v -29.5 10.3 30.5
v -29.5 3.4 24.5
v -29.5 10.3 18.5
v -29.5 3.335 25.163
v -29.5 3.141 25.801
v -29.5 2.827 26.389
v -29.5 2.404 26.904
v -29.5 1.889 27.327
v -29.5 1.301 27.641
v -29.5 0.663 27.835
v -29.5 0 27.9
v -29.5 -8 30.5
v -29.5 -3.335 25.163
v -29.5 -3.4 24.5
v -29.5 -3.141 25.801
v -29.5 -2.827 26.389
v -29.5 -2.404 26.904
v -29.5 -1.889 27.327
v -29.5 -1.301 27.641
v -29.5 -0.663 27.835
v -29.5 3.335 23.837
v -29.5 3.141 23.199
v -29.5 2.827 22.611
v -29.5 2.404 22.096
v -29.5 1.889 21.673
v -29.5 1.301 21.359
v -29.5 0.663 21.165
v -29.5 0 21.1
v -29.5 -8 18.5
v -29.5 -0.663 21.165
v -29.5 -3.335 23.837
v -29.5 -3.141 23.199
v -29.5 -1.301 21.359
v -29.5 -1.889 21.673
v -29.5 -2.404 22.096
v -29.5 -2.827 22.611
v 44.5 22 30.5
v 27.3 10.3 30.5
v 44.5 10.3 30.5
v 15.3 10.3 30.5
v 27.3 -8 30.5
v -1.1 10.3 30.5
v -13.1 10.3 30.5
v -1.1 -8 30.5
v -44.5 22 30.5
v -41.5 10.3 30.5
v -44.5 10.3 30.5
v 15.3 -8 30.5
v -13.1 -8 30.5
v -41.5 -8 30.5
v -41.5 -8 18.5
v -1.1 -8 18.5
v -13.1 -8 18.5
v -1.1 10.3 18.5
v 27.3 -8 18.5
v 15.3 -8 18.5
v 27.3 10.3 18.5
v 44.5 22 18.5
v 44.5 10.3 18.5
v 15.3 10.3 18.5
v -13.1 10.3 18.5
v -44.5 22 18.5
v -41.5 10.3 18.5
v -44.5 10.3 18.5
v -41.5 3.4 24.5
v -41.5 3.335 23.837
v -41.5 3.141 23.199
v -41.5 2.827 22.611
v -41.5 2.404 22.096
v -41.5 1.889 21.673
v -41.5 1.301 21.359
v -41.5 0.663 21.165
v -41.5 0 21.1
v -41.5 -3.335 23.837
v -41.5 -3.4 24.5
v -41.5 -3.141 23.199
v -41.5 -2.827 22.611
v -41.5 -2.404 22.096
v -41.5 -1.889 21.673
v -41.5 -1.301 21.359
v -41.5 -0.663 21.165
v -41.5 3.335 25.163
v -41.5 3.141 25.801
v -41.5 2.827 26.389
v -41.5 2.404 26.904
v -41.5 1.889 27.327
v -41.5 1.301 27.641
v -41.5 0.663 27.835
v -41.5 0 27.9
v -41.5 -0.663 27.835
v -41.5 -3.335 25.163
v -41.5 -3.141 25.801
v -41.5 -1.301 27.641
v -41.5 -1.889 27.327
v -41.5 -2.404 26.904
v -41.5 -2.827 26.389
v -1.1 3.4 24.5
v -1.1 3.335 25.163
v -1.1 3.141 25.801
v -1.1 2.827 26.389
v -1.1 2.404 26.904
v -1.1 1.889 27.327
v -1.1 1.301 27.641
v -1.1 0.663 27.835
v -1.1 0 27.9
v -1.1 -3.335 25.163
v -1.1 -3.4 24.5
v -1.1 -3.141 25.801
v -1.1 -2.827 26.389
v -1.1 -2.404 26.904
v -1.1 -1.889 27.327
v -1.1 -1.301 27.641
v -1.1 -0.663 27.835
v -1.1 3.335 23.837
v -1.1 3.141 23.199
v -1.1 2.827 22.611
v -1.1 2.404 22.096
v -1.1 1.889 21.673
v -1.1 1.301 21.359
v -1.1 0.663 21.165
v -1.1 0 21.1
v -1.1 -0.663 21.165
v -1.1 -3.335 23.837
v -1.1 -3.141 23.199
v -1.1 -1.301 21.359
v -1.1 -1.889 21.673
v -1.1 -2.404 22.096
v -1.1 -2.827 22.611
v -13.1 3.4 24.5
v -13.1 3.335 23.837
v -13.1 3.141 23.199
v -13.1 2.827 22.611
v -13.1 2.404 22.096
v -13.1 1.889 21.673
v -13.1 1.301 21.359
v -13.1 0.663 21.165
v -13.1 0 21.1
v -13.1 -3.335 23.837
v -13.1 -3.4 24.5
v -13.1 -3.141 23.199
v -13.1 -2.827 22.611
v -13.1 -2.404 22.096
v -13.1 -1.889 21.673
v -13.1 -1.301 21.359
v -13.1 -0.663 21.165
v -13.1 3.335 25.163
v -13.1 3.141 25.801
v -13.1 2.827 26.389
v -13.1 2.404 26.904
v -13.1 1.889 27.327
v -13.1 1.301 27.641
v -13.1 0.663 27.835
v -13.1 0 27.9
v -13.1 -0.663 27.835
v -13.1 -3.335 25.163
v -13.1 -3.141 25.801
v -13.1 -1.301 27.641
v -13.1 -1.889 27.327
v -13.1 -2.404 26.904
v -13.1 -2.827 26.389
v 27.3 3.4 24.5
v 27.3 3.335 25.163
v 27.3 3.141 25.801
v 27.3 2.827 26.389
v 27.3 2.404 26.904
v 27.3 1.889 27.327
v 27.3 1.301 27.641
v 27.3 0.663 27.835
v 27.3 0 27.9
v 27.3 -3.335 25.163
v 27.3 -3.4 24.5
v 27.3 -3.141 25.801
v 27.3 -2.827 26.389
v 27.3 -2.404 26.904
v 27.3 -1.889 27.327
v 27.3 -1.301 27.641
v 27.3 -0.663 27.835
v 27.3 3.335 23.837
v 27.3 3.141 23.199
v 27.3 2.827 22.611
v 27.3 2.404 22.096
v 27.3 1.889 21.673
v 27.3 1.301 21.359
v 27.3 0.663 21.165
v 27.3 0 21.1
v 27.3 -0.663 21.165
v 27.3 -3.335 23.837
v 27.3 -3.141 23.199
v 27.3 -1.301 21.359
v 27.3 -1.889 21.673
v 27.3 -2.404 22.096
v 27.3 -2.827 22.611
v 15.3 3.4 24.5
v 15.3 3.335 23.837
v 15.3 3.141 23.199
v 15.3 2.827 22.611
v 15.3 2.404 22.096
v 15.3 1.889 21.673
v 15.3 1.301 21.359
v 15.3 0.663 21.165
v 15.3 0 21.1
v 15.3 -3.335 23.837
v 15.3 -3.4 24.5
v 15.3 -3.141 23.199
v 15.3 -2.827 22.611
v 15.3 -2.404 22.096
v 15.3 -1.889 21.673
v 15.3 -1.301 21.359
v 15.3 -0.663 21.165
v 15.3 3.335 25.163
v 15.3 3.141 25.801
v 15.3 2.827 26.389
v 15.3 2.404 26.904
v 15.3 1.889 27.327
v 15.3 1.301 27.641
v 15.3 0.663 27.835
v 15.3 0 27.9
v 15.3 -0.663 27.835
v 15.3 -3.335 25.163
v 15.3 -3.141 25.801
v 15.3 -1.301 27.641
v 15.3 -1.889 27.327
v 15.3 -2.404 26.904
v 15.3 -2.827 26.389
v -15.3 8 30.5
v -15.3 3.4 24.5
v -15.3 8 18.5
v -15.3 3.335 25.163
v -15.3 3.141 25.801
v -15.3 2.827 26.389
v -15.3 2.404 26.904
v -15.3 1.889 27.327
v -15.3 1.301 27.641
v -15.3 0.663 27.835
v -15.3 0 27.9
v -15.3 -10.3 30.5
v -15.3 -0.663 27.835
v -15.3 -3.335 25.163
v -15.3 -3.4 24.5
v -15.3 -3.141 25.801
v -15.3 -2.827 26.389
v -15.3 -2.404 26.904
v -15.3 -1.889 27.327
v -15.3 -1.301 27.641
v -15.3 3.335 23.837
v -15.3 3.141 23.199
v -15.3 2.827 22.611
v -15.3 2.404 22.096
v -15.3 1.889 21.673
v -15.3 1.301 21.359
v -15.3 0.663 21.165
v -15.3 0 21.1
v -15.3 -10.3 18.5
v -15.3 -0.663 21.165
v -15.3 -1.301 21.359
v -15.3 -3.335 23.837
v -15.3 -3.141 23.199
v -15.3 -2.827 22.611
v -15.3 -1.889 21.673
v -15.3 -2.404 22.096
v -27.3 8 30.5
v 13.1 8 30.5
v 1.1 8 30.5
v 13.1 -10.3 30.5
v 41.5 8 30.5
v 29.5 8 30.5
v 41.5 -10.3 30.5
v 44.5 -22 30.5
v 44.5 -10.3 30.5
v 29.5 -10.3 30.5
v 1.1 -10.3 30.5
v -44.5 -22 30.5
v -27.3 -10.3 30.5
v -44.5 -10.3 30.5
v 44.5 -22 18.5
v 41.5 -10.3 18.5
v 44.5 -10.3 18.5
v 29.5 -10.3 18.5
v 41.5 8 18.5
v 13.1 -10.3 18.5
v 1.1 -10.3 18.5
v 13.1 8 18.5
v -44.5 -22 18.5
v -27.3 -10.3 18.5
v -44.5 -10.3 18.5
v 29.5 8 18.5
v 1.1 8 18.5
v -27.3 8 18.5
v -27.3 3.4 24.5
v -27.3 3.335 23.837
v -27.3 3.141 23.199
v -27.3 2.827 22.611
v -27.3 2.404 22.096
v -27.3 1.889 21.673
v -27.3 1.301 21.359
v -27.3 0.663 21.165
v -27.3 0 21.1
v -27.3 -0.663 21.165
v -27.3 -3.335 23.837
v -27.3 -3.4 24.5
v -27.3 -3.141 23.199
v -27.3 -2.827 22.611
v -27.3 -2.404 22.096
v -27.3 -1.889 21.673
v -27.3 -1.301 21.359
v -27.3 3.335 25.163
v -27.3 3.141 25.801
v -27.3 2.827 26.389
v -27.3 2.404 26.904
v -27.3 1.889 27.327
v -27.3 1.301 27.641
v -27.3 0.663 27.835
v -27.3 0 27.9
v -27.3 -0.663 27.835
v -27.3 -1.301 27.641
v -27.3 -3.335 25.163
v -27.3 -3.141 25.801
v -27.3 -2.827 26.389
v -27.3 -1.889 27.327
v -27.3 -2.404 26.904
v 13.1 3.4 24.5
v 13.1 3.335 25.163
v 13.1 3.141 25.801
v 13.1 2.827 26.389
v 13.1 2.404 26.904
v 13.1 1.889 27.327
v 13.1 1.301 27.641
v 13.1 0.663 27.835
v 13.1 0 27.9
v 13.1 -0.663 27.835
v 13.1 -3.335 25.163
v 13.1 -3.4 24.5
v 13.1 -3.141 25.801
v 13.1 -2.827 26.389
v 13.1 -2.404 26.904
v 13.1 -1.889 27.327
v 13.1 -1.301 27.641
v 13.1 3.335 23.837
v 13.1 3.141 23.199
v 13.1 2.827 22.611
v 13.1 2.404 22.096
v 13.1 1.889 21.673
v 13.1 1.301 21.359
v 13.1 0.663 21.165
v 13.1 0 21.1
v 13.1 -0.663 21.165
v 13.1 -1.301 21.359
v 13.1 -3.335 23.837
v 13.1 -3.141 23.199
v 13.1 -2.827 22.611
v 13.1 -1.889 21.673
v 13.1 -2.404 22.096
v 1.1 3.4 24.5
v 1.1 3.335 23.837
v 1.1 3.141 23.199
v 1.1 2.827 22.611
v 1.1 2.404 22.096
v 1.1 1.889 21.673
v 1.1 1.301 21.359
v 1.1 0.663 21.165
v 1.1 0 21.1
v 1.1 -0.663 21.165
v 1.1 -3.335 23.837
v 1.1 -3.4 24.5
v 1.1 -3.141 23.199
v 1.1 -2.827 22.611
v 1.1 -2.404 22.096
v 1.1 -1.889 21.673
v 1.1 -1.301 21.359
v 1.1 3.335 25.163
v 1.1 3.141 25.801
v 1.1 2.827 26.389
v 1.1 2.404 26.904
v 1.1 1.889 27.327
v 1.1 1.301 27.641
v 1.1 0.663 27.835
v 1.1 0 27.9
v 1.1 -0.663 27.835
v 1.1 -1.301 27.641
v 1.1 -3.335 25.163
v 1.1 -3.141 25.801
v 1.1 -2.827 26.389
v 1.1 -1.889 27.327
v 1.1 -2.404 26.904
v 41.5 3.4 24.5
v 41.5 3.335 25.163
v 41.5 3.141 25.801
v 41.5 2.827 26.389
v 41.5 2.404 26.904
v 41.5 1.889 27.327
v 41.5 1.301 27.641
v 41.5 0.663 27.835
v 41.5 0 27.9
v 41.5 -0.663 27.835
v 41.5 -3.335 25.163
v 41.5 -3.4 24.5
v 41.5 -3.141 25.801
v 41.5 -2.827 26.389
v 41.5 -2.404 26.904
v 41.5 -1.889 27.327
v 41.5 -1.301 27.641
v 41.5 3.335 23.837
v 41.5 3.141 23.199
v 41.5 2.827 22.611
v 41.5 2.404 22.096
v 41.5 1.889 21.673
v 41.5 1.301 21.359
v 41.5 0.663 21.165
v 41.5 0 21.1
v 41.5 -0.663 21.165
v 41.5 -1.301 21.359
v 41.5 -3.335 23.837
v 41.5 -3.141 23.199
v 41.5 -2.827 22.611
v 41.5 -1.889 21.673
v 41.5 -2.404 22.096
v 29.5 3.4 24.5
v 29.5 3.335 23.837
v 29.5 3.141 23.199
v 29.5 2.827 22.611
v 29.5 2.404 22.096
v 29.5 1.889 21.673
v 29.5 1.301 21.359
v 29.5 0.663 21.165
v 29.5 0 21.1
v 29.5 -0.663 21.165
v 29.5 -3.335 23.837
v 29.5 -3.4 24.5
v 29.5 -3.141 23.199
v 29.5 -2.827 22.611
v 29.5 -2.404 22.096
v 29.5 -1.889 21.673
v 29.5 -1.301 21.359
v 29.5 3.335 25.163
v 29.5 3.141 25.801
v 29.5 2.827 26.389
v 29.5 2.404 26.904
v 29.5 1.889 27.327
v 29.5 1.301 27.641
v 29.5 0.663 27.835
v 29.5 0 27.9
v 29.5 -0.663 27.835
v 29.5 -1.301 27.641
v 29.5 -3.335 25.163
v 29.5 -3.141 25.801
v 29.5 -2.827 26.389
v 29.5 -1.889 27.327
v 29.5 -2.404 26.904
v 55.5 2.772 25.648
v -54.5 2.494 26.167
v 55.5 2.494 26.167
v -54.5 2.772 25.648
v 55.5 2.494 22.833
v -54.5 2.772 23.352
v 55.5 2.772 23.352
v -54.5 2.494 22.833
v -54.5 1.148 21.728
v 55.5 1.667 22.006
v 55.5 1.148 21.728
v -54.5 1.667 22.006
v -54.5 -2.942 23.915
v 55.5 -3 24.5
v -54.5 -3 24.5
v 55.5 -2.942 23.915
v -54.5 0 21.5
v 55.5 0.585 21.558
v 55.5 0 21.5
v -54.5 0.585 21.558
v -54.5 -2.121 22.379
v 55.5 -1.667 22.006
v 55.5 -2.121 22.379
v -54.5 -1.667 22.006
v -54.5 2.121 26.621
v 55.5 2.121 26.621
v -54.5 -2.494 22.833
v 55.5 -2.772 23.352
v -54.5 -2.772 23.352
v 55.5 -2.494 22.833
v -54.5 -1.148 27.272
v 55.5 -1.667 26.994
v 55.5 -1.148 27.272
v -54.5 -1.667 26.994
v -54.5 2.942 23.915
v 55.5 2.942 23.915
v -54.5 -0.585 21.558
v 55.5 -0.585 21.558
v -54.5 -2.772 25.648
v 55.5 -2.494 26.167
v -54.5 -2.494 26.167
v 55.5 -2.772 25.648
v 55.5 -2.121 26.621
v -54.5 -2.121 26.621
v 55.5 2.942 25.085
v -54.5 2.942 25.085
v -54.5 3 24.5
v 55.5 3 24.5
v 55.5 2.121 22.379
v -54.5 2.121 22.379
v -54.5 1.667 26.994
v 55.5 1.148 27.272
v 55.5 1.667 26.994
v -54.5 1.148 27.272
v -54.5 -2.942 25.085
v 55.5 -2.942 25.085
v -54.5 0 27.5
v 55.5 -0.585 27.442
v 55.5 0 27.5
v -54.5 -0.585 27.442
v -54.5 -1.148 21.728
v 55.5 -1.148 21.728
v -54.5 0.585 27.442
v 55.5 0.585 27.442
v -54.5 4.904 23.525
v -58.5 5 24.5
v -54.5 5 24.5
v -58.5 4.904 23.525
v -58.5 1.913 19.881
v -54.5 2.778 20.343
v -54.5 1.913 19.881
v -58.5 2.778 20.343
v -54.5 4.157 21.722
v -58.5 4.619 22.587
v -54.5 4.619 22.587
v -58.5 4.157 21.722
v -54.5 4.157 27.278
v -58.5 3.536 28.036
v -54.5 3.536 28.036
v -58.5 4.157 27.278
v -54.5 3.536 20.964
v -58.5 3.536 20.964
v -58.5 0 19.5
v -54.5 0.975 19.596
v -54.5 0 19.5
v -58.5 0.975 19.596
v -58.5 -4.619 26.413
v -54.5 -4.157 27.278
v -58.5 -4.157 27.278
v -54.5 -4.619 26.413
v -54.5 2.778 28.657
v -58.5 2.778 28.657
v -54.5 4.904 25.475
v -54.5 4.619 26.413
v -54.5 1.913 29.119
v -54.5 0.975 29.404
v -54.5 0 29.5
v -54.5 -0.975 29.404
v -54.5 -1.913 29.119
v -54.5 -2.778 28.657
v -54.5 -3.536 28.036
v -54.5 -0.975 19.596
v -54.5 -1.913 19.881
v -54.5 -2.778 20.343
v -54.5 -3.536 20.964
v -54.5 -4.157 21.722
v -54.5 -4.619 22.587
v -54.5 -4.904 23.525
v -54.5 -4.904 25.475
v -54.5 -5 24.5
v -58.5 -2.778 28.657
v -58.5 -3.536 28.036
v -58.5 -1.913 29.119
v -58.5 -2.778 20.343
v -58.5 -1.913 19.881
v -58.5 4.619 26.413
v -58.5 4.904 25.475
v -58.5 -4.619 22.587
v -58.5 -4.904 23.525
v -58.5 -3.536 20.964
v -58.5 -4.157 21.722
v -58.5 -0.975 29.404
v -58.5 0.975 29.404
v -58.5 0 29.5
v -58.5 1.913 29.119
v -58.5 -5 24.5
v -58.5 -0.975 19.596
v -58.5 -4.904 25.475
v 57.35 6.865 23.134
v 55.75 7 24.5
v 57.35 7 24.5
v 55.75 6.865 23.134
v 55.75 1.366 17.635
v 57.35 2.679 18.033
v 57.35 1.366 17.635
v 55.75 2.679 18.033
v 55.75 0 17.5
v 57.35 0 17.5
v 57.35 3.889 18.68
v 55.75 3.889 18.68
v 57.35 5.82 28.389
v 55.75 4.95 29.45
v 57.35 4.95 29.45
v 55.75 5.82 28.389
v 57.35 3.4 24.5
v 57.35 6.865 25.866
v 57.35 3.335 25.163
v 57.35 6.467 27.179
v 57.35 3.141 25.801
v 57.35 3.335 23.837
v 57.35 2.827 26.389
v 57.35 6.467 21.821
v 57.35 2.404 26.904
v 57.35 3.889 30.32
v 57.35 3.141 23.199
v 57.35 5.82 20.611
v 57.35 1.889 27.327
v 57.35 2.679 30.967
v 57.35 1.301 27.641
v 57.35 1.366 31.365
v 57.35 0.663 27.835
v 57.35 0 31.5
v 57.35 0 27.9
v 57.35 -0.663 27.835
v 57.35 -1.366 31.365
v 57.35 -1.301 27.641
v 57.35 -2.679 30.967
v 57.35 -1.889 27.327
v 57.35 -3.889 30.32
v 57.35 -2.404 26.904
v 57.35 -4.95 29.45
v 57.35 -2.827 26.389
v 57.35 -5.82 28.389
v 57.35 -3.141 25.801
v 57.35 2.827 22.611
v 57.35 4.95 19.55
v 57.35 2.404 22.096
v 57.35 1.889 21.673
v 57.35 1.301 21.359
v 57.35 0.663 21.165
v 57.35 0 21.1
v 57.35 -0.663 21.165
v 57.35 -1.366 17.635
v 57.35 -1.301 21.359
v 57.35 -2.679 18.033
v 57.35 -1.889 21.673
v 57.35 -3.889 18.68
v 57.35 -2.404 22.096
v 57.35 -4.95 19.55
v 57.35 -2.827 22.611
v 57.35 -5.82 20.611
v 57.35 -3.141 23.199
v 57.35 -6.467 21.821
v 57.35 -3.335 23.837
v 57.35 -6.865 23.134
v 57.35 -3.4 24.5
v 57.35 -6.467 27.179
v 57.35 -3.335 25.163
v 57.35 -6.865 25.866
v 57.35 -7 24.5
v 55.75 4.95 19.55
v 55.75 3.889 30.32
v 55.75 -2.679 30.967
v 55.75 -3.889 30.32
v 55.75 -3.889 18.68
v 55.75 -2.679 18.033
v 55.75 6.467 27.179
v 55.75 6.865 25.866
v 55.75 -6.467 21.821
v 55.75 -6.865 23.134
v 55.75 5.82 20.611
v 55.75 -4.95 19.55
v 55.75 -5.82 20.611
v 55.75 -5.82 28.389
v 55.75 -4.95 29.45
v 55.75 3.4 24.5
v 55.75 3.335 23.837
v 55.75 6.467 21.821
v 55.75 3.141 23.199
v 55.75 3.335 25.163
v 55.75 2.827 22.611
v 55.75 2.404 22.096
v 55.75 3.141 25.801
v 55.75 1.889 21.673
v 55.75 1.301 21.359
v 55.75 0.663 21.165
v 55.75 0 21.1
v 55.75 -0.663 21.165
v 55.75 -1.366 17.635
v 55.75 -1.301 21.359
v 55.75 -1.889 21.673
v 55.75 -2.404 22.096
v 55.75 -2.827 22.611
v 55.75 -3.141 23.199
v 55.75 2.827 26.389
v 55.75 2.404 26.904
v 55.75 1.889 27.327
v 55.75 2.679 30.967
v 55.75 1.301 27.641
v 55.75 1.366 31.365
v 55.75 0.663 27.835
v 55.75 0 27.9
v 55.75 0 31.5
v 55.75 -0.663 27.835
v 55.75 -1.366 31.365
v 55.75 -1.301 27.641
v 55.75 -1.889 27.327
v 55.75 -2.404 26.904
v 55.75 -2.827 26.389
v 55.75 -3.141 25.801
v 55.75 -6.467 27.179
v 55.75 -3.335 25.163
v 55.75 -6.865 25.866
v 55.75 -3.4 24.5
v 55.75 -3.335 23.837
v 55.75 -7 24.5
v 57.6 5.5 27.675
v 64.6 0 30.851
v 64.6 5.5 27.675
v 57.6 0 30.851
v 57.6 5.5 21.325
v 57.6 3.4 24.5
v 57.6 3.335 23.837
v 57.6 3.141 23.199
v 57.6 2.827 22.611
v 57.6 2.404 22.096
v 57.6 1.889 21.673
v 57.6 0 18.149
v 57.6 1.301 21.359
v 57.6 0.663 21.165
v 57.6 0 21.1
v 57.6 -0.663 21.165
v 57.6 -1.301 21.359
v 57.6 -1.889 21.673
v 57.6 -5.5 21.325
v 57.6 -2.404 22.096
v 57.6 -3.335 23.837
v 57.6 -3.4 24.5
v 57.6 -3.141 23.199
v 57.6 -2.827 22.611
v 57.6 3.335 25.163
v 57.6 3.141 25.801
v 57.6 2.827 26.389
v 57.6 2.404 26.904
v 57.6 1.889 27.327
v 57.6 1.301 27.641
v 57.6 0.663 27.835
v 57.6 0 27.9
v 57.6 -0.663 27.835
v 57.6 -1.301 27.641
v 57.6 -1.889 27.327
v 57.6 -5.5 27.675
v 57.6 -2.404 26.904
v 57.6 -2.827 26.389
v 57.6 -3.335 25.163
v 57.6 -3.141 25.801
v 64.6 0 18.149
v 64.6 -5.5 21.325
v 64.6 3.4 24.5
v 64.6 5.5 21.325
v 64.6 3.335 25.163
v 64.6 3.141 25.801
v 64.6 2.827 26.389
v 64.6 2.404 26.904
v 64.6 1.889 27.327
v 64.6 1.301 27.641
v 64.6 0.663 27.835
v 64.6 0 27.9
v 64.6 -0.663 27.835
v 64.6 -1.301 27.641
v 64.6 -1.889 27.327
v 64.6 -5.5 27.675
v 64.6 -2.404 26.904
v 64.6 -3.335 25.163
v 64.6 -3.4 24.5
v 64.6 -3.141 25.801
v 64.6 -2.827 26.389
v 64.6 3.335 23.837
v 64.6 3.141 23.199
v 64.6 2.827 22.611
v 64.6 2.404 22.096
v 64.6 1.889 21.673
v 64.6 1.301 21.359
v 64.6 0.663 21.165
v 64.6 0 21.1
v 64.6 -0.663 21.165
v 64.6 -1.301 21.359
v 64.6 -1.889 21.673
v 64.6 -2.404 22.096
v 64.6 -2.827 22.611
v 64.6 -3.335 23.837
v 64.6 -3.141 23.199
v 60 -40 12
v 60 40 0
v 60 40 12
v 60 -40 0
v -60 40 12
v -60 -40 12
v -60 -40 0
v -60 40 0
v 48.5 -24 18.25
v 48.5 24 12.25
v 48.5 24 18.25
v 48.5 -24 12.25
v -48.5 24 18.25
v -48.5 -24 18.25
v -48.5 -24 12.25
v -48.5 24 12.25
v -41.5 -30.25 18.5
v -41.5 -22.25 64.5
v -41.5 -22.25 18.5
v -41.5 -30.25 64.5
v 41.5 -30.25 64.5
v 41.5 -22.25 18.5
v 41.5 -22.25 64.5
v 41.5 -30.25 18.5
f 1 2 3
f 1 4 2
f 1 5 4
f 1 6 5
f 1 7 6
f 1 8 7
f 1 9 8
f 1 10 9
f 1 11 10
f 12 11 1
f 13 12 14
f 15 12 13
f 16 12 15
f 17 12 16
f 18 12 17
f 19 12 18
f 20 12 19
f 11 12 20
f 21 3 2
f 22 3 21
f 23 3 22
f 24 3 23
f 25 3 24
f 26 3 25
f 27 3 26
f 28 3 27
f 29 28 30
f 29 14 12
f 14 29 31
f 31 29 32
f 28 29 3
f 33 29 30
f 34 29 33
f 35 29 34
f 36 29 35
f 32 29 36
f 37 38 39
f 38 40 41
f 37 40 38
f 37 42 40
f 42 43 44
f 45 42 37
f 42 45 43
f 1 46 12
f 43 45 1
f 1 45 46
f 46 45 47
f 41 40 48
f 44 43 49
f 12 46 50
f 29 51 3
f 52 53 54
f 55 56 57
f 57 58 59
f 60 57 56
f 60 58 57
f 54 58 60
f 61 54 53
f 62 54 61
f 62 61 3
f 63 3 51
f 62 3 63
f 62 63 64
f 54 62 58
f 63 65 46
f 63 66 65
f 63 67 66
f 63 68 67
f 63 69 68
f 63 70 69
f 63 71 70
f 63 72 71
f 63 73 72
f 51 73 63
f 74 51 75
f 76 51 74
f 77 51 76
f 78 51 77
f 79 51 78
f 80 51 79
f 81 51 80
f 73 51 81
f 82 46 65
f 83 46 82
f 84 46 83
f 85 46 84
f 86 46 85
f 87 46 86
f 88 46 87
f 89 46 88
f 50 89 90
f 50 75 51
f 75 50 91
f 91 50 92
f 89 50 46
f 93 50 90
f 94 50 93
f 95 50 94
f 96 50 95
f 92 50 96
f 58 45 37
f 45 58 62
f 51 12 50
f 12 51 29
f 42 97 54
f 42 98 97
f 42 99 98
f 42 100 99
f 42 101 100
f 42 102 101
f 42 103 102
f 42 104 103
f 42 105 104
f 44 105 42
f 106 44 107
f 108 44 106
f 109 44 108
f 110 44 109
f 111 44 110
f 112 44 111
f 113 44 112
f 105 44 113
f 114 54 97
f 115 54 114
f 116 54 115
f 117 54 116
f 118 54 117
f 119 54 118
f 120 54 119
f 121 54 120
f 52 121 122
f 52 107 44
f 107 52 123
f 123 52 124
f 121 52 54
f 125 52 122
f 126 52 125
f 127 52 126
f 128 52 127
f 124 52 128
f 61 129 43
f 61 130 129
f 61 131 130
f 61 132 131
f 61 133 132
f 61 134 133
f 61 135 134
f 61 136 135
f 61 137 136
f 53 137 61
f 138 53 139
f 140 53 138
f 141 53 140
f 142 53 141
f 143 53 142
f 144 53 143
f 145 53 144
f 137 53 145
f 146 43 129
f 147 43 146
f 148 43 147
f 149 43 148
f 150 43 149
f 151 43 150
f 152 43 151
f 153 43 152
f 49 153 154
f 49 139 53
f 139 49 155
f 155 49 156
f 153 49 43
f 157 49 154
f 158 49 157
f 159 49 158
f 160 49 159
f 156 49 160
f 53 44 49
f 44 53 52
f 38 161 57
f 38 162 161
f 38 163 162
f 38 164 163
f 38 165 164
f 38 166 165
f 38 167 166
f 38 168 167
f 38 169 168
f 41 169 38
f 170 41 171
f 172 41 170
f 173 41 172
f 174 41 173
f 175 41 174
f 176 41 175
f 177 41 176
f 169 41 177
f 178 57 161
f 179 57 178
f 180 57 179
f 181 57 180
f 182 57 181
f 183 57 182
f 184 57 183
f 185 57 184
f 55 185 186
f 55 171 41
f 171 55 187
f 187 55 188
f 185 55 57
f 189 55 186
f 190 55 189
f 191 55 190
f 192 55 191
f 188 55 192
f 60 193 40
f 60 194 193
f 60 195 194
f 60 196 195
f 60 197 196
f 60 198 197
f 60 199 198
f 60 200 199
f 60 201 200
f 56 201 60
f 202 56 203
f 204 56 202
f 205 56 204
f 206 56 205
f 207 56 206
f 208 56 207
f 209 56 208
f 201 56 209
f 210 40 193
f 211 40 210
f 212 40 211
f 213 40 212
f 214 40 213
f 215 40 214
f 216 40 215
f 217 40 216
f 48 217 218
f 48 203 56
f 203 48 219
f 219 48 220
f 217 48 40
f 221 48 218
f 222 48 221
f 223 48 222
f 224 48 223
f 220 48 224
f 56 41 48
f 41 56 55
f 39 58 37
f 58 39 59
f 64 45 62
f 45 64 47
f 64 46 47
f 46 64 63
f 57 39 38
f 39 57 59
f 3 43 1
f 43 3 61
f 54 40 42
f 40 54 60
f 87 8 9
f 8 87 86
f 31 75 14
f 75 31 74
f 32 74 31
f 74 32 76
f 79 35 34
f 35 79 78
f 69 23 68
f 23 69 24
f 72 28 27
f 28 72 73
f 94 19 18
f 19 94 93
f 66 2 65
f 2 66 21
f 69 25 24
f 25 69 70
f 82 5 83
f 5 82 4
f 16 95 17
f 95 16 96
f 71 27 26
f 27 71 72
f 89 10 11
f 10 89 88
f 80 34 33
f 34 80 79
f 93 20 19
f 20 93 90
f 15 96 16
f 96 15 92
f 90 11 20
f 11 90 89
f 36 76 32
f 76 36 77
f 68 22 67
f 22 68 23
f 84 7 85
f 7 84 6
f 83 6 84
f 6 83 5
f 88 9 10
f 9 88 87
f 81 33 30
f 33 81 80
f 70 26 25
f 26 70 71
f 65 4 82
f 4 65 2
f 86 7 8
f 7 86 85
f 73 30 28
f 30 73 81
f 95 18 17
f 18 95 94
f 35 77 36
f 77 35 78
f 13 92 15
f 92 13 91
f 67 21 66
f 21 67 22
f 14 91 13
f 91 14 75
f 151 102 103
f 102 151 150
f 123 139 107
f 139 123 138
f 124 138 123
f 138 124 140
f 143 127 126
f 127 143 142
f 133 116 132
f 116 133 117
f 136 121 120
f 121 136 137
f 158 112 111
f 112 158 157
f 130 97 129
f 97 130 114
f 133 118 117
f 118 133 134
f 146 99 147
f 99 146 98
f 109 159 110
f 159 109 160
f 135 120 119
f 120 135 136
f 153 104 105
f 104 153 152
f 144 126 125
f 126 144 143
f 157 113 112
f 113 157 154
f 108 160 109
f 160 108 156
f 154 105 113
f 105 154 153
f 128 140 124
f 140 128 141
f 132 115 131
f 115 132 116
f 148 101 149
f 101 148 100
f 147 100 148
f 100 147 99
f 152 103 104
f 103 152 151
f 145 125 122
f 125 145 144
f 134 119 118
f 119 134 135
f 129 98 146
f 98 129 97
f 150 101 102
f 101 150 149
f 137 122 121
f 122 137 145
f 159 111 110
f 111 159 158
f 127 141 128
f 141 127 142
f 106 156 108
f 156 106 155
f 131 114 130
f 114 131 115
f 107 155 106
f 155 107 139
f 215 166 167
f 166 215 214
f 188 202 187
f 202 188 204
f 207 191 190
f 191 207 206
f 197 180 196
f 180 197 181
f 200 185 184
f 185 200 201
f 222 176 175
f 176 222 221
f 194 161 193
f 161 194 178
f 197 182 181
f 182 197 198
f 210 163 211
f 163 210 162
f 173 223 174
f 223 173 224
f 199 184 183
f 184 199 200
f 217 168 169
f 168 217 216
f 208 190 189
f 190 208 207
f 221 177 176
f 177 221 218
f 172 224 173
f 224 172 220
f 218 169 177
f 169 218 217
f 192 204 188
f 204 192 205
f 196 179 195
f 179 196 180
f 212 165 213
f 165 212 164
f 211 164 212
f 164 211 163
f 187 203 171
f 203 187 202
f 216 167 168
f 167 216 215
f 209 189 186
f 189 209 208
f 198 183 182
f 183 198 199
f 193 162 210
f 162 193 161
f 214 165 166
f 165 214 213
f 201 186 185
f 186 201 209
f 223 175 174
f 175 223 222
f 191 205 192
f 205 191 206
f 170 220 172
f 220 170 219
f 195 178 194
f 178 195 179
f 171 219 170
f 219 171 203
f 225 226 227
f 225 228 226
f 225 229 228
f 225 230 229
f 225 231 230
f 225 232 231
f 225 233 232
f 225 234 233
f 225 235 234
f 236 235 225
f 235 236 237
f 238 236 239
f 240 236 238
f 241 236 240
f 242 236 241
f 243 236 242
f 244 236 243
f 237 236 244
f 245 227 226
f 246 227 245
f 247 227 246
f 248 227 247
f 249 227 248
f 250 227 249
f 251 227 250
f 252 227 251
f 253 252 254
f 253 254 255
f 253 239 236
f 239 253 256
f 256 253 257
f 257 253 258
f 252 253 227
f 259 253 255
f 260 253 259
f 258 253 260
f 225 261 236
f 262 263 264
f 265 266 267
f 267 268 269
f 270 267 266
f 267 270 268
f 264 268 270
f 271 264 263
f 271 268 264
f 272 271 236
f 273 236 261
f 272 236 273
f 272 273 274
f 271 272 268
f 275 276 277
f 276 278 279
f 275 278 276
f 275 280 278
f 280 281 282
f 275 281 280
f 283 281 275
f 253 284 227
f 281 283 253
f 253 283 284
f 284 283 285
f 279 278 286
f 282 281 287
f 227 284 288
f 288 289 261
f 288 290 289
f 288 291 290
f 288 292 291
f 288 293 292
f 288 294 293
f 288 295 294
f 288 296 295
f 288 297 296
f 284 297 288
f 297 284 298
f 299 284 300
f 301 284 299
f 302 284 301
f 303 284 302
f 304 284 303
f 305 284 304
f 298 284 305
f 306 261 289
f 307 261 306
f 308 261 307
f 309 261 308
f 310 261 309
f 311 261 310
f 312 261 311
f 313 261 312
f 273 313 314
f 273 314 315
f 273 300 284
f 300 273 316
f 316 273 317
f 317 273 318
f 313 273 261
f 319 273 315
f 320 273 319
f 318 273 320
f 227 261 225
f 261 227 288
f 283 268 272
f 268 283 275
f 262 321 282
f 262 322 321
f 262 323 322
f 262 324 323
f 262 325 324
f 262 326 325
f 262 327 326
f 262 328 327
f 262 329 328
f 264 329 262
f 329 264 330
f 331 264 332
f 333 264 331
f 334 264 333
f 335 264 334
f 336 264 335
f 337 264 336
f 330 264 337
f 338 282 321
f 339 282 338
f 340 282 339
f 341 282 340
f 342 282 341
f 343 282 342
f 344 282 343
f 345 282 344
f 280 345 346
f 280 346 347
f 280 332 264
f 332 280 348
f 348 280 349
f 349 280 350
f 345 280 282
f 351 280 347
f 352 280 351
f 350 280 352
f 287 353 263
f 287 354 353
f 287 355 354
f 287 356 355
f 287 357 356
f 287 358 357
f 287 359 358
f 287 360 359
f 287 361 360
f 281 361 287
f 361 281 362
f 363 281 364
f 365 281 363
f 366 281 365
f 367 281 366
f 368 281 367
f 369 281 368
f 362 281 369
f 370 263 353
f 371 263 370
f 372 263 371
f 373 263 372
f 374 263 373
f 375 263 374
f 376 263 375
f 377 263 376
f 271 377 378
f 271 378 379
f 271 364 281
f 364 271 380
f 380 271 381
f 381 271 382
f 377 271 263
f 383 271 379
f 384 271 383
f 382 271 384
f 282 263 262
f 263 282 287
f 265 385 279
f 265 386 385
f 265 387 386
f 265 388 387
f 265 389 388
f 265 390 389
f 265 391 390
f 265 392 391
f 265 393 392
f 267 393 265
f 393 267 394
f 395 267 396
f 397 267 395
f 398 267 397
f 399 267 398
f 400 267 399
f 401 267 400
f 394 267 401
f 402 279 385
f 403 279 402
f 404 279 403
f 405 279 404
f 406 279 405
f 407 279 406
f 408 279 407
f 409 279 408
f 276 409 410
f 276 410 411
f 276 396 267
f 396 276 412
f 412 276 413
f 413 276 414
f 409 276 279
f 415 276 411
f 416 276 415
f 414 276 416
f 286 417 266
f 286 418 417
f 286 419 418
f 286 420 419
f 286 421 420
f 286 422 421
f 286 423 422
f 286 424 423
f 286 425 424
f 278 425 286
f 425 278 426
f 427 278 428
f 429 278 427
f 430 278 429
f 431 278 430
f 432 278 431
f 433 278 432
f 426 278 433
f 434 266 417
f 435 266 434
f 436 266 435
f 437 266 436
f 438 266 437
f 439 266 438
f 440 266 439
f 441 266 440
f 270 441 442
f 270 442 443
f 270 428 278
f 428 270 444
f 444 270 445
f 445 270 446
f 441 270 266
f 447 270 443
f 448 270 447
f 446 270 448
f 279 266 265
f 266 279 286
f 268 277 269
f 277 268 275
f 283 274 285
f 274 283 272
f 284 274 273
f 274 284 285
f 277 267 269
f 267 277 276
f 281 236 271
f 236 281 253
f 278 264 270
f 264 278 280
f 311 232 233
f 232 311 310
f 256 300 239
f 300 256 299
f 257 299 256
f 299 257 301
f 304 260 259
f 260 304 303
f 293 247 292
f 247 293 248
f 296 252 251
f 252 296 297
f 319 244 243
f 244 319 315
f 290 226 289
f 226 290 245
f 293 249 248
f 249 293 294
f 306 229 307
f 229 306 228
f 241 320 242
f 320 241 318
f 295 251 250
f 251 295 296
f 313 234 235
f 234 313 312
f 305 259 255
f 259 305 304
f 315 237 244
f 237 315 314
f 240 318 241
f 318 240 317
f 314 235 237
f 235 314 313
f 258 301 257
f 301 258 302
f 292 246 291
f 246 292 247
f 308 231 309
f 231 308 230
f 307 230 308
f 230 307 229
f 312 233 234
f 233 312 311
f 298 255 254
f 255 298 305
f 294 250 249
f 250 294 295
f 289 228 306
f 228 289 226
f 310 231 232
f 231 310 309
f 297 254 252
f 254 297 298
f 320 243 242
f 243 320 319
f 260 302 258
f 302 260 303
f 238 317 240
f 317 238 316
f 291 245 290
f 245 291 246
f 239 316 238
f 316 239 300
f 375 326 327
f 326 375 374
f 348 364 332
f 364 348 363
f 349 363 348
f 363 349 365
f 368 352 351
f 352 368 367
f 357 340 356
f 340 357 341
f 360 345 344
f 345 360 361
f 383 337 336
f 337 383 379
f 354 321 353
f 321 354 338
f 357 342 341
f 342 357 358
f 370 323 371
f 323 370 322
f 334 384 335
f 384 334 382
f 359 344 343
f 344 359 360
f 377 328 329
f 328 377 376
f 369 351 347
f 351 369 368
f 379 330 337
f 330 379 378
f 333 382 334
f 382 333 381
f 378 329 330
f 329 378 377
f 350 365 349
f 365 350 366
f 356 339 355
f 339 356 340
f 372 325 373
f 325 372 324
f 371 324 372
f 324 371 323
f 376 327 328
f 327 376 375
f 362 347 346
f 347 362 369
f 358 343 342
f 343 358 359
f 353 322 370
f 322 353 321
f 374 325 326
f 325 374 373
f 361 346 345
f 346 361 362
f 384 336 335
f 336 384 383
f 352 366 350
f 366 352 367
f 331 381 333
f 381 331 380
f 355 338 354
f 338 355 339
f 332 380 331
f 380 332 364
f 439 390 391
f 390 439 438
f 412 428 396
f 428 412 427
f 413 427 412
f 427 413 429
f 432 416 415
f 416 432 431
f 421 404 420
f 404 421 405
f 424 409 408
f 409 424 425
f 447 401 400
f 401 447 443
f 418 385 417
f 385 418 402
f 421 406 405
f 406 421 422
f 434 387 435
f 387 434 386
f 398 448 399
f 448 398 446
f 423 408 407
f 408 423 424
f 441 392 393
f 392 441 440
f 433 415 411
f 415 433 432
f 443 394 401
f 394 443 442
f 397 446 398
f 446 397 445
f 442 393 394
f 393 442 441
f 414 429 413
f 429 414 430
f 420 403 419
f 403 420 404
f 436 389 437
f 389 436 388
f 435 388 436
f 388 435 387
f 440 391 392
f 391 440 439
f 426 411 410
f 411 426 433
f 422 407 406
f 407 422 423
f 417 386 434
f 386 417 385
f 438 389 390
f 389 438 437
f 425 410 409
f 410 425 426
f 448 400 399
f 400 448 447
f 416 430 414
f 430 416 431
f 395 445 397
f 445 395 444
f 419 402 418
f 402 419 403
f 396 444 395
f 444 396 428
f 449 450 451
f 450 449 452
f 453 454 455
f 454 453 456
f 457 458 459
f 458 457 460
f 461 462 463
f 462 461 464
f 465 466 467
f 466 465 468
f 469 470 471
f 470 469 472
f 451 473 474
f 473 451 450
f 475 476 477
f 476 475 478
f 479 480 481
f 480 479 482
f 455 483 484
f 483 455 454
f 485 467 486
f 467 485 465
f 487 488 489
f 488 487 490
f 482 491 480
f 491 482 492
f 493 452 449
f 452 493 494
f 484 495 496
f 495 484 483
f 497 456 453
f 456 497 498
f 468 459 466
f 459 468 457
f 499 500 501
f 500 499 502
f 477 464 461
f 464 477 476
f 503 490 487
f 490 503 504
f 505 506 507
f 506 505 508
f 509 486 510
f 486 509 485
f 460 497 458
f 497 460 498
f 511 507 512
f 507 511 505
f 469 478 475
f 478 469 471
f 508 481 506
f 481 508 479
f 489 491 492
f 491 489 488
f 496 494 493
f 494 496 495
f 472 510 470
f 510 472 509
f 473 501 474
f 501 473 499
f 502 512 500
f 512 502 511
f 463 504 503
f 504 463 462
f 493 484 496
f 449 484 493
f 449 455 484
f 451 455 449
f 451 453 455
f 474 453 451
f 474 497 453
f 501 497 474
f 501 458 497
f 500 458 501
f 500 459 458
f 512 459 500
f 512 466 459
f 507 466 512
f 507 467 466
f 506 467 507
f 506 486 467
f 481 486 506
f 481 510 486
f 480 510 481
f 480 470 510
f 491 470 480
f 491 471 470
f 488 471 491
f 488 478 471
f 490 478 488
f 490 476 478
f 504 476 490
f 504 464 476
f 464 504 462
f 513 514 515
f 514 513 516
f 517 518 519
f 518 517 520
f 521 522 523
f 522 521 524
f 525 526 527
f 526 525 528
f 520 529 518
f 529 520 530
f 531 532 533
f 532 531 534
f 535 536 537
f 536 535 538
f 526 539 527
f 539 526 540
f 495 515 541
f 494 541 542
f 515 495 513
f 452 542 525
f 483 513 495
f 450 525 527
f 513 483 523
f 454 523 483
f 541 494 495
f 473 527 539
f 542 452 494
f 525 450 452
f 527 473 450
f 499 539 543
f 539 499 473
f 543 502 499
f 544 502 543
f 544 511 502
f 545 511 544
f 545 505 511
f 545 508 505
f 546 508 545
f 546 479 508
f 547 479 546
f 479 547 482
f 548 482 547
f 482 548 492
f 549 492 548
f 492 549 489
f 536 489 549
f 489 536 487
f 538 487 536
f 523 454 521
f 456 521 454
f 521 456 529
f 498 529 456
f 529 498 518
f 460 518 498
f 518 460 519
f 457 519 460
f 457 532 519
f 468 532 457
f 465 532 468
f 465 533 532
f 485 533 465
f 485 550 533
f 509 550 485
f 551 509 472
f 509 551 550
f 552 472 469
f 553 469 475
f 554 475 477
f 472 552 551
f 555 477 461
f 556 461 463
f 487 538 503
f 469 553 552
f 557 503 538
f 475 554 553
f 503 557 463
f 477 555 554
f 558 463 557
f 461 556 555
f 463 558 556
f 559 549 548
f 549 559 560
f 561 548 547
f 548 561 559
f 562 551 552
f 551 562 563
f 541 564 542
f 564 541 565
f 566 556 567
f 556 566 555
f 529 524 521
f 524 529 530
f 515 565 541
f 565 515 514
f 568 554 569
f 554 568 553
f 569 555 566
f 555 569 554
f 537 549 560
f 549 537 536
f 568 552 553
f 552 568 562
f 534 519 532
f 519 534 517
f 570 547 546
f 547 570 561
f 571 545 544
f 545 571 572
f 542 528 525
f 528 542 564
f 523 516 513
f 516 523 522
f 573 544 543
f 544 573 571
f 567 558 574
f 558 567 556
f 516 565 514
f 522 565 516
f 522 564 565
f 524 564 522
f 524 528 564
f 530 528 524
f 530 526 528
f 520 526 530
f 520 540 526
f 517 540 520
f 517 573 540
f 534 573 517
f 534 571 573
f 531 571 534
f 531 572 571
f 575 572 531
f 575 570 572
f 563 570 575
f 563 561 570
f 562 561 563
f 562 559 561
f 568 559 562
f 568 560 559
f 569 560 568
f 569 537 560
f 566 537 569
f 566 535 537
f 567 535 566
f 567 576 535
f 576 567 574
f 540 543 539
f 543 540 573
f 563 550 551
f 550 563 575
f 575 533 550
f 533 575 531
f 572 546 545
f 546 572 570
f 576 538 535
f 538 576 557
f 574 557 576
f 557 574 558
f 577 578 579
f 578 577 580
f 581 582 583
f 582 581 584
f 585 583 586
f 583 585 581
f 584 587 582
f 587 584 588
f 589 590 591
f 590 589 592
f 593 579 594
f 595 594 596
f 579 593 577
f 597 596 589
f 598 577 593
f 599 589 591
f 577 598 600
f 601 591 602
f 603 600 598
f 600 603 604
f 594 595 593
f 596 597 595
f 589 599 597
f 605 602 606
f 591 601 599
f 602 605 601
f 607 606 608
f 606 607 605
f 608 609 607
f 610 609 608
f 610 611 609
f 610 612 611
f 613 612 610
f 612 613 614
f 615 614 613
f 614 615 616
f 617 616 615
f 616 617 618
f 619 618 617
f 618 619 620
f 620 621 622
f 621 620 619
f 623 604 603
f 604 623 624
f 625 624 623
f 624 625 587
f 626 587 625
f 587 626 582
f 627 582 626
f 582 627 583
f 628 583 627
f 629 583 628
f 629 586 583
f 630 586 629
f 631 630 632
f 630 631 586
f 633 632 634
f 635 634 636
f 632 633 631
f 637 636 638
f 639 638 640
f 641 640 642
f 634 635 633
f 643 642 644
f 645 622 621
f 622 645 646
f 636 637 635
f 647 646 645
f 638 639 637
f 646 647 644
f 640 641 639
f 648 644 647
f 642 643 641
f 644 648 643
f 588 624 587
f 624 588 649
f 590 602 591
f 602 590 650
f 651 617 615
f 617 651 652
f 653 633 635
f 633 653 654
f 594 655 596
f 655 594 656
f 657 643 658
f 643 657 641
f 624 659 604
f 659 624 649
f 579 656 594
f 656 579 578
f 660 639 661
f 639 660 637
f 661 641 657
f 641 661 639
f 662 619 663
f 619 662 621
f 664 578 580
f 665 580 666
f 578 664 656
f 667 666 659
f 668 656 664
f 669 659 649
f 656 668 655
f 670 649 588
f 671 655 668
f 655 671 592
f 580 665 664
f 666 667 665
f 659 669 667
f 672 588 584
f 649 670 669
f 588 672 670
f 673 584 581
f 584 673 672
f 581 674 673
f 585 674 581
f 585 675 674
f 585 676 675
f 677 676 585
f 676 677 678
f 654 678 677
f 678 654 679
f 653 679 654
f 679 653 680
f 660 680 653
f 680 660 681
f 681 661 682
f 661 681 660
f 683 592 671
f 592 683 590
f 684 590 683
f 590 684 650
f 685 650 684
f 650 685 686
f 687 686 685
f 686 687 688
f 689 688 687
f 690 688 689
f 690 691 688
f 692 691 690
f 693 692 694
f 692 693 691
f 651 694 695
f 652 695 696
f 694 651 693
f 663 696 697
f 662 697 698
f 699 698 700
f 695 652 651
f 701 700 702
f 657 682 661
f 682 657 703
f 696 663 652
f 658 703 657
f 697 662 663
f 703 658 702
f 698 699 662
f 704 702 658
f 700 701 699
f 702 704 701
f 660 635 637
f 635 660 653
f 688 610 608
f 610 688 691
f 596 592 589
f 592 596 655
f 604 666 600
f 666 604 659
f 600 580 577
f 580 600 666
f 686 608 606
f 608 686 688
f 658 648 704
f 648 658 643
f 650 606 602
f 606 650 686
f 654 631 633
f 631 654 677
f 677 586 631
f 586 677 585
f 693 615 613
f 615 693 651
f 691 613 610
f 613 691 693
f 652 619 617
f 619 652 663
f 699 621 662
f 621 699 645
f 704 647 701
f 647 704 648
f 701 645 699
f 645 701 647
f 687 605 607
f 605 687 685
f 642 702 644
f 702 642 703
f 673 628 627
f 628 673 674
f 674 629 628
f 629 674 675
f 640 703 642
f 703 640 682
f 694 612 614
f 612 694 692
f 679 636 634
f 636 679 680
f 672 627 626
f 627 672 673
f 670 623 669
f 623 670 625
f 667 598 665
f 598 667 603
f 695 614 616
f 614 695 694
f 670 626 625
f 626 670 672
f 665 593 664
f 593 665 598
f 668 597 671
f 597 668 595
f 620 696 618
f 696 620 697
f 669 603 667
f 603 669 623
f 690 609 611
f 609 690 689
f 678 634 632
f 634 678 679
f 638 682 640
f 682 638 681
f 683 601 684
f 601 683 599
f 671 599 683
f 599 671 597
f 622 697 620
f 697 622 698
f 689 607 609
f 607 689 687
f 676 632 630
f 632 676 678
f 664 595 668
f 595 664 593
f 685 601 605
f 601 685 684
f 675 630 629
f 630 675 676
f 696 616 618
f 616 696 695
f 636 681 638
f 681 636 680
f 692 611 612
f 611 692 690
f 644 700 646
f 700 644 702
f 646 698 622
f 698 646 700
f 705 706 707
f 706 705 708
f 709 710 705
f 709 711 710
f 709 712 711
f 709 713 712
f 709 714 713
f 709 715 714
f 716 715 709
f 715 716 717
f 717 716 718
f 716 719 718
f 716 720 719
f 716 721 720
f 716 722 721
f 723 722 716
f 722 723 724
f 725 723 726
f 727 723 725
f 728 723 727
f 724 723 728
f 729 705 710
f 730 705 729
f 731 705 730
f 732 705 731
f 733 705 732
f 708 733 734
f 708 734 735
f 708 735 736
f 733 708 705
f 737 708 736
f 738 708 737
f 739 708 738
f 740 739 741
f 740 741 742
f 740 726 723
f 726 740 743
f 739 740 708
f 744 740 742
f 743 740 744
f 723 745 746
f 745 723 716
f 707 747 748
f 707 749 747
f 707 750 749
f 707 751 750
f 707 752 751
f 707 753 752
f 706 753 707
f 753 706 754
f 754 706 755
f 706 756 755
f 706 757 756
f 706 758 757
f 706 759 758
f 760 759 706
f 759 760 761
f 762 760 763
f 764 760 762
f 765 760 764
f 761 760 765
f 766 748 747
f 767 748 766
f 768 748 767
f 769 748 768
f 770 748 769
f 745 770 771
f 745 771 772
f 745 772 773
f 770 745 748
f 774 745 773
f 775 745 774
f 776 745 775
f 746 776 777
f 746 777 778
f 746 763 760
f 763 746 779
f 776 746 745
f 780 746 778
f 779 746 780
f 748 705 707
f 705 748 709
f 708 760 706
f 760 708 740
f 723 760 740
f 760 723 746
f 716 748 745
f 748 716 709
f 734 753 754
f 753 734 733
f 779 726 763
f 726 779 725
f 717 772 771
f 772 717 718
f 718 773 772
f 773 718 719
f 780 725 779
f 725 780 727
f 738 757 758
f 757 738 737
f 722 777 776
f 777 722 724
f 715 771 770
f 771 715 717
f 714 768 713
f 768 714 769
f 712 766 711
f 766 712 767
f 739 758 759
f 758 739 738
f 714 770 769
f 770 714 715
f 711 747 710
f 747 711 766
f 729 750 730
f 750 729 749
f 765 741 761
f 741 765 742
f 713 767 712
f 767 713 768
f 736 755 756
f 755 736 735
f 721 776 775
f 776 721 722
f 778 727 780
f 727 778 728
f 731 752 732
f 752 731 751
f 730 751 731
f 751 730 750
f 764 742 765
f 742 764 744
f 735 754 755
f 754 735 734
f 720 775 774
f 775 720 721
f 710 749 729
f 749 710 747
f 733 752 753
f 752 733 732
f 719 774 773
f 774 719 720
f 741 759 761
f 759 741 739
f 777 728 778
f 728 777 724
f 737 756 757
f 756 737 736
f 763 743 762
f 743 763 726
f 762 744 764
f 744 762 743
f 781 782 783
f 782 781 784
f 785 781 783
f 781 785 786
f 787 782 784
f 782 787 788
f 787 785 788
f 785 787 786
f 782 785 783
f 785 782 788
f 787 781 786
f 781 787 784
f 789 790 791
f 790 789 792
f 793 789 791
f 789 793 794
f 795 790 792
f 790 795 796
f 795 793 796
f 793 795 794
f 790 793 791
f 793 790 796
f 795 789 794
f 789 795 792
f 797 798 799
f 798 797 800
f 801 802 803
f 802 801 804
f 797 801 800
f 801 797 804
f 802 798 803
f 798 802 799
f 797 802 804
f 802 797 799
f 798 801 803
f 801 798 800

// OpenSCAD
$fn = 32;

// ------------------------------------------------------------------------
// Comb hinge with flap: leaf 89 x 22 mm, pin d6, flap 46 mm
// Every part is its own module, assembly() places every instance.
// ------------------------------------------------------------------------

// --- part 1 ---
module hinge_bed() {
  difference() {
    translate([-60, -40, 0]) cube([120, 80, 12]);
  }
}

// --- part 2 ---
module hinge_riser() {
  difference() {
    translate([-48.5, -24, 0]) cube([97, 48, 6]);
  }
}

// --- part 3 ---
module hinge_leaf_a() {
  difference() {
    union() {
      translate([-41.5, -8, -6]) cube([12, 30, 12]);
      translate([-13.1, -8, -6]) cube([12, 30, 12]);
      translate([15.3, -8, -6]) cube([12, 30, 12]);
      translate([-44.5, 10.3, -6]) cube([89, 11.7, 12]);
    }
    translate([-35.5, 0, 0]) rotate([0, 90, 0]) cylinder(h = 14, d = 6.8, center = true);
    translate([-7.1, 0, 0]) rotate([0, 90, 0]) cylinder(h = 14, d = 6.8, center = true);
    translate([21.3, 0, 0]) rotate([0, 90, 0]) cylinder(h = 14, d = 6.8, center = true);
  }
}

// --- part 4 ---
module hinge_leaf_b() {
  difference() {
    union() {
      translate([-27.3, -22, -6]) cube([12, 30, 12]);
      translate([1.1, -22, -6]) cube([12, 30, 12]);
      translate([29.5, -22, -6]) cube([12, 30, 12]);
      translate([-44.5, -22, -6]) cube([89, 11.7, 12]);
    }
    translate([-21.3, 0, 0]) rotate([0, 90, 0]) cylinder(h = 14, d = 6.8, center = true);
    translate([7.1, 0, 0]) rotate([0, 90, 0]) cylinder(h = 14, d = 6.8, center = true);
    translate([35.5, 0, 0]) rotate([0, 90, 0]) cylinder(h = 14, d = 6.8, center = true);
  }
}

// --- part 5 ---
module hinge_flap() {
  difference() {
    translate([-41.5, -23, 0]) cube([83, 46, 8]);
  }
}

// --- part 6 ---
module hinge_pin() {
  rotate([0, 90, 0]) cylinder(h = 111, d = 6, center = true);
  translate([-58.5, 0, 0]) rotate([0, 90, 0]) cylinder(h = 4, d = 10);
}

// --- part 7 ---
module pin_washer() {
  difference() {
      translate([0, 0, 0]) cylinder(h = 1.6, d = 14);
      translate([0, 0, -1]) cylinder(h = 3.6, d = 6.8);
    }
}

// --- part 8 ---
module pin_nut() {
  difference() {
    linear_extrude(height = 7) polygon(points = [[6.351, 0], [3.175, 5.5], [-3.175, 5.5], [-6.351, 0], [-3.175, -5.5], [3.175, -5.5]]);
    translate([0, 0, -1]) cylinder(h = 9, d = 6.8);
  }
}

// --- assembly ---
module assembly() {
  color([0.80, 0.24, 0.20]) translate([0, 0, 0]) rotate([0, 0, 0]) hinge_bed();
  color([0.20, 0.45, 0.75]) translate([0, 0, 12.25]) rotate([0, 0, 0]) hinge_riser();
  color([0.25, 0.62, 0.32]) translate([0, 0, 24.5]) rotate([0, 0, 0]) hinge_leaf_a();
  color([0.92, 0.70, 0.18]) translate([0, 0, 24.5]) rotate([0, 0, 0]) hinge_leaf_b();
  color([0.58, 0.35, 0.70]) translate([0, -22.25, 41.5]) rotate([90, 0, 0]) hinge_flap();
  color([0.16, 0.66, 0.66]) translate([0, 0, 24.5]) rotate([0, 0, 0]) hinge_pin();
  color([0.85, 0.48, 0.18]) translate([55.75, 0, 24.5]) rotate([0, 90, 0]) pin_washer();
  color([0.55, 0.60, 0.65]) translate([57.6, 0, 24.5]) rotate([0, 90, 0]) pin_nut();
}

assembly();
